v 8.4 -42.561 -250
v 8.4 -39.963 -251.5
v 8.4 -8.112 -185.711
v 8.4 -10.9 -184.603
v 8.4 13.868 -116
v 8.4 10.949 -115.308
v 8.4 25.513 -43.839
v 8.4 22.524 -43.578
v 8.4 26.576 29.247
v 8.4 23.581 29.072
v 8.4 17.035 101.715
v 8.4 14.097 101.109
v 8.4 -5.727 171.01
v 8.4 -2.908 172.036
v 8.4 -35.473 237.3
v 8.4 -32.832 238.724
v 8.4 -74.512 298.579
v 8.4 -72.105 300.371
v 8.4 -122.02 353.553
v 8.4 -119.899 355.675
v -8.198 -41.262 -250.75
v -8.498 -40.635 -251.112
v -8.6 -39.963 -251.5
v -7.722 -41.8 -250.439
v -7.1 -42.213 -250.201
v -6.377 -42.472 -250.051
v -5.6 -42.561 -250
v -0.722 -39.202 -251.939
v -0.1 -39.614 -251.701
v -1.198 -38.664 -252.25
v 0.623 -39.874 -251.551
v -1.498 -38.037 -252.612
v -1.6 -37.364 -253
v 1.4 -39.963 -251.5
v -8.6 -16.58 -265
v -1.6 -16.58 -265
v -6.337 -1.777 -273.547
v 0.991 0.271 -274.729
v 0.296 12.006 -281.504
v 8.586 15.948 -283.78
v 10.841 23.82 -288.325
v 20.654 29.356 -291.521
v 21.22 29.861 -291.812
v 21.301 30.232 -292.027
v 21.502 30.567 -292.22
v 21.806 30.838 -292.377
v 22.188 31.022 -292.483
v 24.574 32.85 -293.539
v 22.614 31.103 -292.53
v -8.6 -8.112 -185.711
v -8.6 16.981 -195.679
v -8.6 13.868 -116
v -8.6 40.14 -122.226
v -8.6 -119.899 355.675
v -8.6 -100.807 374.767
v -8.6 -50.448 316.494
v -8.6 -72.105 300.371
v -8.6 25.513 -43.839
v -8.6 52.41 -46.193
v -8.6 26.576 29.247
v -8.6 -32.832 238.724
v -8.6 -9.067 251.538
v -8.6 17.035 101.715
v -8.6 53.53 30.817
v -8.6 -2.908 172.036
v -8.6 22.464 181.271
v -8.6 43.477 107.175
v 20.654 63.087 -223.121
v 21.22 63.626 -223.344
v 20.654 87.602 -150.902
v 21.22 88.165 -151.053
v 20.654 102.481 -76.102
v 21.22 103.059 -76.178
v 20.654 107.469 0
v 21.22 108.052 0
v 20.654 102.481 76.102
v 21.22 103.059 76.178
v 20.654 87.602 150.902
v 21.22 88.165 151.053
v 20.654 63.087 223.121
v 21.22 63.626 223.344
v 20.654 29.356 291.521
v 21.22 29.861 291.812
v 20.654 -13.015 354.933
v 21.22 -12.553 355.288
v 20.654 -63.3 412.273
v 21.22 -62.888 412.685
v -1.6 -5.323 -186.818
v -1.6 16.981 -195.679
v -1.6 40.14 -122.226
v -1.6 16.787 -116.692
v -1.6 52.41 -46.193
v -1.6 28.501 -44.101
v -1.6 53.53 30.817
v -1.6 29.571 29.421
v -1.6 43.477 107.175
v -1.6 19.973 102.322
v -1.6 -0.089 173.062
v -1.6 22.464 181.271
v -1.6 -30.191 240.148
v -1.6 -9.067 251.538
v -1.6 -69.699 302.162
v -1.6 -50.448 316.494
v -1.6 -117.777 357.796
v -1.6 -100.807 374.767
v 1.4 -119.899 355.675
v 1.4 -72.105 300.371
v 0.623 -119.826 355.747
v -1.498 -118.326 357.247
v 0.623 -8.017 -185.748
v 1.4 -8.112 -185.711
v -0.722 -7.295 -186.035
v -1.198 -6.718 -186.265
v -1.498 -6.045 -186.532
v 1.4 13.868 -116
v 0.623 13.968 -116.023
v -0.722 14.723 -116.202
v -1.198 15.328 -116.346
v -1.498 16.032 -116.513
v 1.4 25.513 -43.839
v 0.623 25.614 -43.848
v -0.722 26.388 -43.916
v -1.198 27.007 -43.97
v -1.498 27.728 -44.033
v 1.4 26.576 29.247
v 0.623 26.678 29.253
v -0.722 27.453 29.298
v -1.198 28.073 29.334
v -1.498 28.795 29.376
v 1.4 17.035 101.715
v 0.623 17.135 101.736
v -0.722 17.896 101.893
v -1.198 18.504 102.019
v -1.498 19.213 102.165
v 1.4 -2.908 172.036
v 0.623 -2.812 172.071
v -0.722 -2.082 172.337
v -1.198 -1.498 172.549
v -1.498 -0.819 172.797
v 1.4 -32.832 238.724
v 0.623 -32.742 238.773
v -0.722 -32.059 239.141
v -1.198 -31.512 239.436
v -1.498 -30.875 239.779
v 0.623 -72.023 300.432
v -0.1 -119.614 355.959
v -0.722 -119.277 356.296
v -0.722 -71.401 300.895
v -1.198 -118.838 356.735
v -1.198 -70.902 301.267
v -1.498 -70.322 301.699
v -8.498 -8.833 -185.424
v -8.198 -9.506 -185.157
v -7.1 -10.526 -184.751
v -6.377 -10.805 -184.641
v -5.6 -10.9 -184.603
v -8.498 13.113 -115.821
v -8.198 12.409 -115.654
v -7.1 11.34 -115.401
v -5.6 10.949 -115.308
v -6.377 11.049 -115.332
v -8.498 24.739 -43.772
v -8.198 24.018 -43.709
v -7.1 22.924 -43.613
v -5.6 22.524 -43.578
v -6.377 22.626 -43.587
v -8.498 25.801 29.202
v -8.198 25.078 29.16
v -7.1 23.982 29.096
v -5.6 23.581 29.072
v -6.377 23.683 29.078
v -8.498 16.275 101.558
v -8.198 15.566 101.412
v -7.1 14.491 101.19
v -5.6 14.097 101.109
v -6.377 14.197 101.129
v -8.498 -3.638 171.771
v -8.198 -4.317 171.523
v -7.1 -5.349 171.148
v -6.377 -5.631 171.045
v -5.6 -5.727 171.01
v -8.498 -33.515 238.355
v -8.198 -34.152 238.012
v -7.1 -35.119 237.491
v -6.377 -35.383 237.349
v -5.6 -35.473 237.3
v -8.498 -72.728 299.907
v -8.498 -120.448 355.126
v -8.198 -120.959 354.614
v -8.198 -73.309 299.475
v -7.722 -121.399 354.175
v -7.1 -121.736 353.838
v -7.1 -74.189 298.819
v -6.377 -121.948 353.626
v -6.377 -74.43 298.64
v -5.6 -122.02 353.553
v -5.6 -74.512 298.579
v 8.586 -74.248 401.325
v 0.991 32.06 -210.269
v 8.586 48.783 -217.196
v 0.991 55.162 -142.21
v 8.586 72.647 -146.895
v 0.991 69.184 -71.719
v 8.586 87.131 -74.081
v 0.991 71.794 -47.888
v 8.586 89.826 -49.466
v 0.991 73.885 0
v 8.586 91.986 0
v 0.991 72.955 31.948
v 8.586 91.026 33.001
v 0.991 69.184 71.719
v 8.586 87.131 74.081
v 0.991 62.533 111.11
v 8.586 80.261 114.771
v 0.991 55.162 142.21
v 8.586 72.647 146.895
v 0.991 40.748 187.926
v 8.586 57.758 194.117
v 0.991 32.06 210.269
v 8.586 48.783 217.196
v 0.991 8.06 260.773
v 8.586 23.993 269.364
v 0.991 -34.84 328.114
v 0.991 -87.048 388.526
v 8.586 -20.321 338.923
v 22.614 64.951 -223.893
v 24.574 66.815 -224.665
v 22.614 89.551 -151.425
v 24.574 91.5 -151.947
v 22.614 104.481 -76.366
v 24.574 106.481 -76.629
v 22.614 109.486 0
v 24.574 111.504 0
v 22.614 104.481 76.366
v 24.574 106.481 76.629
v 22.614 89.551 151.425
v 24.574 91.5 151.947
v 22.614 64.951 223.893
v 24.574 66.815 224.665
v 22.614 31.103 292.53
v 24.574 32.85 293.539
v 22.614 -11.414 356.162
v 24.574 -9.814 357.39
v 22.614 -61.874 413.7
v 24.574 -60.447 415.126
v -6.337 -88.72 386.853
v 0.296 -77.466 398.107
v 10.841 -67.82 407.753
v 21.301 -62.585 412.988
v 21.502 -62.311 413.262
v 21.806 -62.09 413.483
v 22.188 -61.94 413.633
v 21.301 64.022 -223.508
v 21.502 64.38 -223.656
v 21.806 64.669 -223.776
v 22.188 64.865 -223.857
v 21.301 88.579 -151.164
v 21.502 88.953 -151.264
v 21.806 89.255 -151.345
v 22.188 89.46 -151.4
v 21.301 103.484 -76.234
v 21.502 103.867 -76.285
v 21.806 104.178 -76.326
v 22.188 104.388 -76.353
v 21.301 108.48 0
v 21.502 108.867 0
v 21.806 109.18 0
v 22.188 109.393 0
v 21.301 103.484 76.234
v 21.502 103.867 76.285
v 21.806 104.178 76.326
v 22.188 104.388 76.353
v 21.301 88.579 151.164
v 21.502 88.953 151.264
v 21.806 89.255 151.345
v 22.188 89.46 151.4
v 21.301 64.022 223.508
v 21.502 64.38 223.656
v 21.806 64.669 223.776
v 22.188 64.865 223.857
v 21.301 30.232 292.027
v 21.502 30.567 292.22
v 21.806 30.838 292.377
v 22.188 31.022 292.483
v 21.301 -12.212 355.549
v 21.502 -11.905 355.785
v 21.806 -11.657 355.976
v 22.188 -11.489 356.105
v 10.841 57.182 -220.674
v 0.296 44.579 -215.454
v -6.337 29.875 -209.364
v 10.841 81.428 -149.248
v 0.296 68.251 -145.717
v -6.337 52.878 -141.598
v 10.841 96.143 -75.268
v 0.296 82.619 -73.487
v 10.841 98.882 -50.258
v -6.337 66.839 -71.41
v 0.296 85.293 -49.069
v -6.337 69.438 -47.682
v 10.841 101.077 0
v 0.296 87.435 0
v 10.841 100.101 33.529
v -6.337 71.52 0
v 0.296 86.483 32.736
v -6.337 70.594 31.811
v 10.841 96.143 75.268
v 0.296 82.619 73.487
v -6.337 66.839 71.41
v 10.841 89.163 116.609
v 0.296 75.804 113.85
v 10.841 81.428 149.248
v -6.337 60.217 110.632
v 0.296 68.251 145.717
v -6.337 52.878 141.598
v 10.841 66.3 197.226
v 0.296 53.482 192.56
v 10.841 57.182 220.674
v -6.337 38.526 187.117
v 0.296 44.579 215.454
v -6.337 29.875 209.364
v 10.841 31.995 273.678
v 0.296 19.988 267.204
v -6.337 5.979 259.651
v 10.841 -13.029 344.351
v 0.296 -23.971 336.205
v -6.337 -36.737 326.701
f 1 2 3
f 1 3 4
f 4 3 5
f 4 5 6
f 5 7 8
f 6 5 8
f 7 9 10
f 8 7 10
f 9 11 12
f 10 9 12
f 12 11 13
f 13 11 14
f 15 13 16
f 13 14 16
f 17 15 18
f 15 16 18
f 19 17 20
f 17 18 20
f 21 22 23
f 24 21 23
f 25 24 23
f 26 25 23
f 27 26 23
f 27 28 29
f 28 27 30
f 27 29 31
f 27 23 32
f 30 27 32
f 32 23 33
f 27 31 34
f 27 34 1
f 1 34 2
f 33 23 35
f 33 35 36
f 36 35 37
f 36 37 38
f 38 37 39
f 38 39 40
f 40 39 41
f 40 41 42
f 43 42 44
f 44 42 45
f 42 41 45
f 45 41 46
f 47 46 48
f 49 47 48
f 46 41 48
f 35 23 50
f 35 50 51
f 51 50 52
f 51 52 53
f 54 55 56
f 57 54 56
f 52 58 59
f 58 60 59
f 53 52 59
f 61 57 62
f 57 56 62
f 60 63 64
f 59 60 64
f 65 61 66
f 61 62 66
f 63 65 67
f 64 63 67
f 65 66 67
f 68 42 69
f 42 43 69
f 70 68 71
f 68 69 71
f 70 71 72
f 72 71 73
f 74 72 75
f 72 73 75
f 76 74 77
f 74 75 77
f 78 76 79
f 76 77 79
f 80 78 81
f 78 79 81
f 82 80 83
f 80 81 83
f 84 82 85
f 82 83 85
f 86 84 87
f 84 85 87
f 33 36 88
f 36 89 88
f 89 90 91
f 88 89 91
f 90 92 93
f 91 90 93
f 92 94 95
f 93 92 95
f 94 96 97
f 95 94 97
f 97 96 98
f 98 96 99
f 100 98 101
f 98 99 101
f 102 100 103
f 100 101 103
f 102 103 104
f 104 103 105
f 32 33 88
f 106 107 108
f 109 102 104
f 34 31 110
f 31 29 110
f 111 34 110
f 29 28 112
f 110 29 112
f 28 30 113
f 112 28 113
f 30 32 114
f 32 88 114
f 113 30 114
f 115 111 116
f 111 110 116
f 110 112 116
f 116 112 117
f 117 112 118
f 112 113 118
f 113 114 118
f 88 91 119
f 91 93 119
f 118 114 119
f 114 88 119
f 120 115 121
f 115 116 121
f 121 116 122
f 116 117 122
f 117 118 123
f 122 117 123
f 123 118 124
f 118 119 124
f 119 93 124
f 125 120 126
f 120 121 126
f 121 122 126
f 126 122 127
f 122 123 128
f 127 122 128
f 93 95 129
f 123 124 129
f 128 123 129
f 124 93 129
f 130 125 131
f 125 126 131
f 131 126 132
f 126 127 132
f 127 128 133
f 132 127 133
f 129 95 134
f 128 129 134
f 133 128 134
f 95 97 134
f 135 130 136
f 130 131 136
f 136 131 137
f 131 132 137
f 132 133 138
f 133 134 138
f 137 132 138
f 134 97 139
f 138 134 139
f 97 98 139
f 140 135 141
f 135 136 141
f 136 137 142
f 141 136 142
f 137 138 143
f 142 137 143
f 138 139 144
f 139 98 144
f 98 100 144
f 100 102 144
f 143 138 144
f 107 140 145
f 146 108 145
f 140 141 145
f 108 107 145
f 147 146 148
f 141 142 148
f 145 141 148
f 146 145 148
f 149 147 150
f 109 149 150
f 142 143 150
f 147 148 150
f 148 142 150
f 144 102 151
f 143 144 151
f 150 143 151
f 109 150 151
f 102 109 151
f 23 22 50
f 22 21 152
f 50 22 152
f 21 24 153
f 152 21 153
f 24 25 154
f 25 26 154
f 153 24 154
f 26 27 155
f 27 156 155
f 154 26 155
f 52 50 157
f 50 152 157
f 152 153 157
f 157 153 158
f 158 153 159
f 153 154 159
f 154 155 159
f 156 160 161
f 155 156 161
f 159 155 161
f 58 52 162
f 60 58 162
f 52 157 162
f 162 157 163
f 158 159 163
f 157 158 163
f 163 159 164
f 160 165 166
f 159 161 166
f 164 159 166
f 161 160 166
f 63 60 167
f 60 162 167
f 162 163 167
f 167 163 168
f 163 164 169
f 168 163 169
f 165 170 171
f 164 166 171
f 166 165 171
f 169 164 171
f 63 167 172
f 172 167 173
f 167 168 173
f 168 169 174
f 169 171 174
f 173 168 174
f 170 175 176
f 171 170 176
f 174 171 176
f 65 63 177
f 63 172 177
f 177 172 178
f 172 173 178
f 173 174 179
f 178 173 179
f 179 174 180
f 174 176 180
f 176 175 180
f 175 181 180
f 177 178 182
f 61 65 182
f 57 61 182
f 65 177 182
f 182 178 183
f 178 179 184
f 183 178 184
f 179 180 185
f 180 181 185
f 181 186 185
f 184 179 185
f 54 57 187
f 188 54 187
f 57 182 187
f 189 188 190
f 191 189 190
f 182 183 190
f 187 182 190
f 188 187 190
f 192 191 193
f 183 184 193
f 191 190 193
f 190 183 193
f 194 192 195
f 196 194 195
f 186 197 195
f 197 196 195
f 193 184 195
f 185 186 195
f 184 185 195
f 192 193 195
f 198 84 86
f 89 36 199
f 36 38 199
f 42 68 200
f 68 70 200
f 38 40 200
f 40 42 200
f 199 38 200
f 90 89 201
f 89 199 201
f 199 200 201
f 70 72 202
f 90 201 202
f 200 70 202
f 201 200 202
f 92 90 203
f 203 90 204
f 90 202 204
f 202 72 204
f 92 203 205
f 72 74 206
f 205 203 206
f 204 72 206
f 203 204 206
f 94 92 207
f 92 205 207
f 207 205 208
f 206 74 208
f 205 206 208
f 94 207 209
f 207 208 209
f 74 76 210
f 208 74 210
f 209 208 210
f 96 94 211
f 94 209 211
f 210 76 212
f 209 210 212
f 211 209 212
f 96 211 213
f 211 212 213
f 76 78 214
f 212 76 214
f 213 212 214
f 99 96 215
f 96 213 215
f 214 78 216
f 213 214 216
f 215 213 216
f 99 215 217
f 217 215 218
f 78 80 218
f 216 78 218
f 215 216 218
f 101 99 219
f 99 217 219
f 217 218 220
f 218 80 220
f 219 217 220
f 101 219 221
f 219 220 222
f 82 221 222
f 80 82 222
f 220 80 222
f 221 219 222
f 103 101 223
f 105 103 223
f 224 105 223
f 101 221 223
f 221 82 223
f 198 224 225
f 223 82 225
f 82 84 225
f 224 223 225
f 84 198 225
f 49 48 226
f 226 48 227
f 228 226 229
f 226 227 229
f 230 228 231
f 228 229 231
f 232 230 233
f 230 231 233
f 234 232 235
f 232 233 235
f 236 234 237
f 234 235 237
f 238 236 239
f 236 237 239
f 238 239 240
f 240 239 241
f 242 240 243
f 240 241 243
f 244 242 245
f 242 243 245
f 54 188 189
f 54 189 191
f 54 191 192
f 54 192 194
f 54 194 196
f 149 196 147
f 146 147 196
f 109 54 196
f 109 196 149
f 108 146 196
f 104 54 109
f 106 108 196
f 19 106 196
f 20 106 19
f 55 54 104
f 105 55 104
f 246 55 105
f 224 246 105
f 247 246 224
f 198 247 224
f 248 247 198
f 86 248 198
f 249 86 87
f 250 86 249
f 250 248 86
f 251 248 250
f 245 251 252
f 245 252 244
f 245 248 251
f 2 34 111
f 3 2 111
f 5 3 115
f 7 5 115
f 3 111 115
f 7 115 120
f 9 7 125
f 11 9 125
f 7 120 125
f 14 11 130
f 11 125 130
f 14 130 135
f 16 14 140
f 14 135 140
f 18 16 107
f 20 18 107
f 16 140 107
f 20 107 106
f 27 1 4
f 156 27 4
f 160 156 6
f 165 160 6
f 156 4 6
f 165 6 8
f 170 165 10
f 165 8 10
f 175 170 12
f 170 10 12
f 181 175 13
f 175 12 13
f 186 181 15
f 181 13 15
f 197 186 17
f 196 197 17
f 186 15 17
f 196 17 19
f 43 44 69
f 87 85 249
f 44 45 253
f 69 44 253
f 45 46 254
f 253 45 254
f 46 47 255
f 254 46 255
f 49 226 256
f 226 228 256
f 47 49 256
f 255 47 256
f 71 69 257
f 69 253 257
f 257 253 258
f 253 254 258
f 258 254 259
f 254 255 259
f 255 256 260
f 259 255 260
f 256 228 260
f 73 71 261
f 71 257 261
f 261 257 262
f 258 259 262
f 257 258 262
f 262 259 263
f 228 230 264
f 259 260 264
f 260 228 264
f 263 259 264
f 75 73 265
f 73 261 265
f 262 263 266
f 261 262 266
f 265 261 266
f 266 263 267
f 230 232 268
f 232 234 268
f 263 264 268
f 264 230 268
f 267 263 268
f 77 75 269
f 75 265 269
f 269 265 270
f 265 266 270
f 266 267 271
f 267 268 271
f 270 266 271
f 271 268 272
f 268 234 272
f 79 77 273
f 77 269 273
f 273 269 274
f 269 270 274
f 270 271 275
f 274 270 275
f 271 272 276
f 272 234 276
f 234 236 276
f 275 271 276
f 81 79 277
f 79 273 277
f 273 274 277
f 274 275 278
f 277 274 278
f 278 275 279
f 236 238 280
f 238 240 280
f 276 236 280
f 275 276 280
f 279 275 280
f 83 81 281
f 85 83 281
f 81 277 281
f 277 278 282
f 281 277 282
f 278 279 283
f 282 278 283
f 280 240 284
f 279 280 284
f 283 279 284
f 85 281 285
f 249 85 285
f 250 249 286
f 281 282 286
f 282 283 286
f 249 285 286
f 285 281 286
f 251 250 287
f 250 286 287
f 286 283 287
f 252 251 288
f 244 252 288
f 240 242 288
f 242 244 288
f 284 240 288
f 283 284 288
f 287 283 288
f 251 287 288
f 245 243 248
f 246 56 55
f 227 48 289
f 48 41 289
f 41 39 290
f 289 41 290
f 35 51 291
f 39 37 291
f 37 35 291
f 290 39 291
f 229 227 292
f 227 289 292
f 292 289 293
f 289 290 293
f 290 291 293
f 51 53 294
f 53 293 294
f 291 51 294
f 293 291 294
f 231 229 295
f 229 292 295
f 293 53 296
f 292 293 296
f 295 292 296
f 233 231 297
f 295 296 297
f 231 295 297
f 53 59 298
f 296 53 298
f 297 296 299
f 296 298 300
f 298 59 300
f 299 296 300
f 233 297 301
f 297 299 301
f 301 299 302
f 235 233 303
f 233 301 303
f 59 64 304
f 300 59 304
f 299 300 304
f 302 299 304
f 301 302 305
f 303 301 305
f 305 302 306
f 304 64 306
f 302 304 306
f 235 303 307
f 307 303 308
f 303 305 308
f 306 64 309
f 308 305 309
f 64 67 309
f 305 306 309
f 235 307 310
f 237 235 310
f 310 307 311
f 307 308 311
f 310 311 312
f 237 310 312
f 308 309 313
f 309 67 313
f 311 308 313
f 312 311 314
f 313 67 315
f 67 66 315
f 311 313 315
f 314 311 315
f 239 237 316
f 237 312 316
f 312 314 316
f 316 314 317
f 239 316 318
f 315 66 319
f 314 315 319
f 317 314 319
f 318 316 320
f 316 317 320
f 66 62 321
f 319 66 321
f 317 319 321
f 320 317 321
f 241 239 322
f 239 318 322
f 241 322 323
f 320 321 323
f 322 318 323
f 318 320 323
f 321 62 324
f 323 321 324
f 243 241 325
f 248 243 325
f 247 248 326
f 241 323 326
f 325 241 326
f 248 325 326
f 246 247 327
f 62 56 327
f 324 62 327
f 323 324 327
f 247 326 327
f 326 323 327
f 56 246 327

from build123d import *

# Parameters (mm, degrees)
F1_ANGLE_BACK = 30
F1_ANGLE      = 75
F2_R          = 3
F3_R          = 3


with BuildPart() as f1:
    # F0 (on Top) → F1 (revolve)
    with BuildSketch(Plane.XY, mode=Mode.PRIVATE) as f1_sk:
        with BuildLine():
            ThreePointArc((24.5736017823, 111.5037277341), (0.2955596523, 87.4353562361), (-8.600258129, 54.4266564399))
            Line((-8.600258129, 54.4266564399), (-8.600258129, 24.4266564399))
            Line((-8.600258129, 24.4266564399), (8.399741871, 24.4266564399))
            Line((8.399741871, 24.4266564399), (8.399741871, 27.4266564399))
            Line((8.399741871, 27.4266564399), (-1.600258129, 27.4266564399))
            Line((-1.600258129, 27.4266564399), (-1.600258129, 54.4266564399))
            ThreePointArc((-1.600258129, 54.4266564399), (4.1886480826, 83.1872765912), (20.6537842751, 107.4686273932))
            Line((20.6537842751, 107.4686273932), (21.2201206089, 108.0516198232))
            ThreePointArc((21.2201206089, 108.0516198232), (21.6429306698, 109.0350473427), (22.6136930287, 109.4861775637))
            Line((22.6136930287, 109.4861775637), (24.5736017823, 111.5037277341))
        make_face()
    revolve(f1_sk.sketch.rotate(Axis((5.6419791654, -475.5733435601, 0), (1, 0, 0)), -F1_ANGLE_BACK), axis=Axis((5.6419791654, -475.5733435601, 0), (1, 0, 0)), revolution_arc=F1_ANGLE)

    # F2
    f2_edges = [f1.edges().sort_by_distance(p)[0] for p in [
        (-8.600258, 20.149087, 65.263096),
    ]]
    fillet(f2_edges, radius=F2_R)

    # F3
    f3_edges = [f1.edges().sort_by_distance(p)[0] for p in [
        (-1.600258, 23.123422, 65.654675),
    ]]
    fillet(f3_edges, radius=F3_R)


solid = f1.part
